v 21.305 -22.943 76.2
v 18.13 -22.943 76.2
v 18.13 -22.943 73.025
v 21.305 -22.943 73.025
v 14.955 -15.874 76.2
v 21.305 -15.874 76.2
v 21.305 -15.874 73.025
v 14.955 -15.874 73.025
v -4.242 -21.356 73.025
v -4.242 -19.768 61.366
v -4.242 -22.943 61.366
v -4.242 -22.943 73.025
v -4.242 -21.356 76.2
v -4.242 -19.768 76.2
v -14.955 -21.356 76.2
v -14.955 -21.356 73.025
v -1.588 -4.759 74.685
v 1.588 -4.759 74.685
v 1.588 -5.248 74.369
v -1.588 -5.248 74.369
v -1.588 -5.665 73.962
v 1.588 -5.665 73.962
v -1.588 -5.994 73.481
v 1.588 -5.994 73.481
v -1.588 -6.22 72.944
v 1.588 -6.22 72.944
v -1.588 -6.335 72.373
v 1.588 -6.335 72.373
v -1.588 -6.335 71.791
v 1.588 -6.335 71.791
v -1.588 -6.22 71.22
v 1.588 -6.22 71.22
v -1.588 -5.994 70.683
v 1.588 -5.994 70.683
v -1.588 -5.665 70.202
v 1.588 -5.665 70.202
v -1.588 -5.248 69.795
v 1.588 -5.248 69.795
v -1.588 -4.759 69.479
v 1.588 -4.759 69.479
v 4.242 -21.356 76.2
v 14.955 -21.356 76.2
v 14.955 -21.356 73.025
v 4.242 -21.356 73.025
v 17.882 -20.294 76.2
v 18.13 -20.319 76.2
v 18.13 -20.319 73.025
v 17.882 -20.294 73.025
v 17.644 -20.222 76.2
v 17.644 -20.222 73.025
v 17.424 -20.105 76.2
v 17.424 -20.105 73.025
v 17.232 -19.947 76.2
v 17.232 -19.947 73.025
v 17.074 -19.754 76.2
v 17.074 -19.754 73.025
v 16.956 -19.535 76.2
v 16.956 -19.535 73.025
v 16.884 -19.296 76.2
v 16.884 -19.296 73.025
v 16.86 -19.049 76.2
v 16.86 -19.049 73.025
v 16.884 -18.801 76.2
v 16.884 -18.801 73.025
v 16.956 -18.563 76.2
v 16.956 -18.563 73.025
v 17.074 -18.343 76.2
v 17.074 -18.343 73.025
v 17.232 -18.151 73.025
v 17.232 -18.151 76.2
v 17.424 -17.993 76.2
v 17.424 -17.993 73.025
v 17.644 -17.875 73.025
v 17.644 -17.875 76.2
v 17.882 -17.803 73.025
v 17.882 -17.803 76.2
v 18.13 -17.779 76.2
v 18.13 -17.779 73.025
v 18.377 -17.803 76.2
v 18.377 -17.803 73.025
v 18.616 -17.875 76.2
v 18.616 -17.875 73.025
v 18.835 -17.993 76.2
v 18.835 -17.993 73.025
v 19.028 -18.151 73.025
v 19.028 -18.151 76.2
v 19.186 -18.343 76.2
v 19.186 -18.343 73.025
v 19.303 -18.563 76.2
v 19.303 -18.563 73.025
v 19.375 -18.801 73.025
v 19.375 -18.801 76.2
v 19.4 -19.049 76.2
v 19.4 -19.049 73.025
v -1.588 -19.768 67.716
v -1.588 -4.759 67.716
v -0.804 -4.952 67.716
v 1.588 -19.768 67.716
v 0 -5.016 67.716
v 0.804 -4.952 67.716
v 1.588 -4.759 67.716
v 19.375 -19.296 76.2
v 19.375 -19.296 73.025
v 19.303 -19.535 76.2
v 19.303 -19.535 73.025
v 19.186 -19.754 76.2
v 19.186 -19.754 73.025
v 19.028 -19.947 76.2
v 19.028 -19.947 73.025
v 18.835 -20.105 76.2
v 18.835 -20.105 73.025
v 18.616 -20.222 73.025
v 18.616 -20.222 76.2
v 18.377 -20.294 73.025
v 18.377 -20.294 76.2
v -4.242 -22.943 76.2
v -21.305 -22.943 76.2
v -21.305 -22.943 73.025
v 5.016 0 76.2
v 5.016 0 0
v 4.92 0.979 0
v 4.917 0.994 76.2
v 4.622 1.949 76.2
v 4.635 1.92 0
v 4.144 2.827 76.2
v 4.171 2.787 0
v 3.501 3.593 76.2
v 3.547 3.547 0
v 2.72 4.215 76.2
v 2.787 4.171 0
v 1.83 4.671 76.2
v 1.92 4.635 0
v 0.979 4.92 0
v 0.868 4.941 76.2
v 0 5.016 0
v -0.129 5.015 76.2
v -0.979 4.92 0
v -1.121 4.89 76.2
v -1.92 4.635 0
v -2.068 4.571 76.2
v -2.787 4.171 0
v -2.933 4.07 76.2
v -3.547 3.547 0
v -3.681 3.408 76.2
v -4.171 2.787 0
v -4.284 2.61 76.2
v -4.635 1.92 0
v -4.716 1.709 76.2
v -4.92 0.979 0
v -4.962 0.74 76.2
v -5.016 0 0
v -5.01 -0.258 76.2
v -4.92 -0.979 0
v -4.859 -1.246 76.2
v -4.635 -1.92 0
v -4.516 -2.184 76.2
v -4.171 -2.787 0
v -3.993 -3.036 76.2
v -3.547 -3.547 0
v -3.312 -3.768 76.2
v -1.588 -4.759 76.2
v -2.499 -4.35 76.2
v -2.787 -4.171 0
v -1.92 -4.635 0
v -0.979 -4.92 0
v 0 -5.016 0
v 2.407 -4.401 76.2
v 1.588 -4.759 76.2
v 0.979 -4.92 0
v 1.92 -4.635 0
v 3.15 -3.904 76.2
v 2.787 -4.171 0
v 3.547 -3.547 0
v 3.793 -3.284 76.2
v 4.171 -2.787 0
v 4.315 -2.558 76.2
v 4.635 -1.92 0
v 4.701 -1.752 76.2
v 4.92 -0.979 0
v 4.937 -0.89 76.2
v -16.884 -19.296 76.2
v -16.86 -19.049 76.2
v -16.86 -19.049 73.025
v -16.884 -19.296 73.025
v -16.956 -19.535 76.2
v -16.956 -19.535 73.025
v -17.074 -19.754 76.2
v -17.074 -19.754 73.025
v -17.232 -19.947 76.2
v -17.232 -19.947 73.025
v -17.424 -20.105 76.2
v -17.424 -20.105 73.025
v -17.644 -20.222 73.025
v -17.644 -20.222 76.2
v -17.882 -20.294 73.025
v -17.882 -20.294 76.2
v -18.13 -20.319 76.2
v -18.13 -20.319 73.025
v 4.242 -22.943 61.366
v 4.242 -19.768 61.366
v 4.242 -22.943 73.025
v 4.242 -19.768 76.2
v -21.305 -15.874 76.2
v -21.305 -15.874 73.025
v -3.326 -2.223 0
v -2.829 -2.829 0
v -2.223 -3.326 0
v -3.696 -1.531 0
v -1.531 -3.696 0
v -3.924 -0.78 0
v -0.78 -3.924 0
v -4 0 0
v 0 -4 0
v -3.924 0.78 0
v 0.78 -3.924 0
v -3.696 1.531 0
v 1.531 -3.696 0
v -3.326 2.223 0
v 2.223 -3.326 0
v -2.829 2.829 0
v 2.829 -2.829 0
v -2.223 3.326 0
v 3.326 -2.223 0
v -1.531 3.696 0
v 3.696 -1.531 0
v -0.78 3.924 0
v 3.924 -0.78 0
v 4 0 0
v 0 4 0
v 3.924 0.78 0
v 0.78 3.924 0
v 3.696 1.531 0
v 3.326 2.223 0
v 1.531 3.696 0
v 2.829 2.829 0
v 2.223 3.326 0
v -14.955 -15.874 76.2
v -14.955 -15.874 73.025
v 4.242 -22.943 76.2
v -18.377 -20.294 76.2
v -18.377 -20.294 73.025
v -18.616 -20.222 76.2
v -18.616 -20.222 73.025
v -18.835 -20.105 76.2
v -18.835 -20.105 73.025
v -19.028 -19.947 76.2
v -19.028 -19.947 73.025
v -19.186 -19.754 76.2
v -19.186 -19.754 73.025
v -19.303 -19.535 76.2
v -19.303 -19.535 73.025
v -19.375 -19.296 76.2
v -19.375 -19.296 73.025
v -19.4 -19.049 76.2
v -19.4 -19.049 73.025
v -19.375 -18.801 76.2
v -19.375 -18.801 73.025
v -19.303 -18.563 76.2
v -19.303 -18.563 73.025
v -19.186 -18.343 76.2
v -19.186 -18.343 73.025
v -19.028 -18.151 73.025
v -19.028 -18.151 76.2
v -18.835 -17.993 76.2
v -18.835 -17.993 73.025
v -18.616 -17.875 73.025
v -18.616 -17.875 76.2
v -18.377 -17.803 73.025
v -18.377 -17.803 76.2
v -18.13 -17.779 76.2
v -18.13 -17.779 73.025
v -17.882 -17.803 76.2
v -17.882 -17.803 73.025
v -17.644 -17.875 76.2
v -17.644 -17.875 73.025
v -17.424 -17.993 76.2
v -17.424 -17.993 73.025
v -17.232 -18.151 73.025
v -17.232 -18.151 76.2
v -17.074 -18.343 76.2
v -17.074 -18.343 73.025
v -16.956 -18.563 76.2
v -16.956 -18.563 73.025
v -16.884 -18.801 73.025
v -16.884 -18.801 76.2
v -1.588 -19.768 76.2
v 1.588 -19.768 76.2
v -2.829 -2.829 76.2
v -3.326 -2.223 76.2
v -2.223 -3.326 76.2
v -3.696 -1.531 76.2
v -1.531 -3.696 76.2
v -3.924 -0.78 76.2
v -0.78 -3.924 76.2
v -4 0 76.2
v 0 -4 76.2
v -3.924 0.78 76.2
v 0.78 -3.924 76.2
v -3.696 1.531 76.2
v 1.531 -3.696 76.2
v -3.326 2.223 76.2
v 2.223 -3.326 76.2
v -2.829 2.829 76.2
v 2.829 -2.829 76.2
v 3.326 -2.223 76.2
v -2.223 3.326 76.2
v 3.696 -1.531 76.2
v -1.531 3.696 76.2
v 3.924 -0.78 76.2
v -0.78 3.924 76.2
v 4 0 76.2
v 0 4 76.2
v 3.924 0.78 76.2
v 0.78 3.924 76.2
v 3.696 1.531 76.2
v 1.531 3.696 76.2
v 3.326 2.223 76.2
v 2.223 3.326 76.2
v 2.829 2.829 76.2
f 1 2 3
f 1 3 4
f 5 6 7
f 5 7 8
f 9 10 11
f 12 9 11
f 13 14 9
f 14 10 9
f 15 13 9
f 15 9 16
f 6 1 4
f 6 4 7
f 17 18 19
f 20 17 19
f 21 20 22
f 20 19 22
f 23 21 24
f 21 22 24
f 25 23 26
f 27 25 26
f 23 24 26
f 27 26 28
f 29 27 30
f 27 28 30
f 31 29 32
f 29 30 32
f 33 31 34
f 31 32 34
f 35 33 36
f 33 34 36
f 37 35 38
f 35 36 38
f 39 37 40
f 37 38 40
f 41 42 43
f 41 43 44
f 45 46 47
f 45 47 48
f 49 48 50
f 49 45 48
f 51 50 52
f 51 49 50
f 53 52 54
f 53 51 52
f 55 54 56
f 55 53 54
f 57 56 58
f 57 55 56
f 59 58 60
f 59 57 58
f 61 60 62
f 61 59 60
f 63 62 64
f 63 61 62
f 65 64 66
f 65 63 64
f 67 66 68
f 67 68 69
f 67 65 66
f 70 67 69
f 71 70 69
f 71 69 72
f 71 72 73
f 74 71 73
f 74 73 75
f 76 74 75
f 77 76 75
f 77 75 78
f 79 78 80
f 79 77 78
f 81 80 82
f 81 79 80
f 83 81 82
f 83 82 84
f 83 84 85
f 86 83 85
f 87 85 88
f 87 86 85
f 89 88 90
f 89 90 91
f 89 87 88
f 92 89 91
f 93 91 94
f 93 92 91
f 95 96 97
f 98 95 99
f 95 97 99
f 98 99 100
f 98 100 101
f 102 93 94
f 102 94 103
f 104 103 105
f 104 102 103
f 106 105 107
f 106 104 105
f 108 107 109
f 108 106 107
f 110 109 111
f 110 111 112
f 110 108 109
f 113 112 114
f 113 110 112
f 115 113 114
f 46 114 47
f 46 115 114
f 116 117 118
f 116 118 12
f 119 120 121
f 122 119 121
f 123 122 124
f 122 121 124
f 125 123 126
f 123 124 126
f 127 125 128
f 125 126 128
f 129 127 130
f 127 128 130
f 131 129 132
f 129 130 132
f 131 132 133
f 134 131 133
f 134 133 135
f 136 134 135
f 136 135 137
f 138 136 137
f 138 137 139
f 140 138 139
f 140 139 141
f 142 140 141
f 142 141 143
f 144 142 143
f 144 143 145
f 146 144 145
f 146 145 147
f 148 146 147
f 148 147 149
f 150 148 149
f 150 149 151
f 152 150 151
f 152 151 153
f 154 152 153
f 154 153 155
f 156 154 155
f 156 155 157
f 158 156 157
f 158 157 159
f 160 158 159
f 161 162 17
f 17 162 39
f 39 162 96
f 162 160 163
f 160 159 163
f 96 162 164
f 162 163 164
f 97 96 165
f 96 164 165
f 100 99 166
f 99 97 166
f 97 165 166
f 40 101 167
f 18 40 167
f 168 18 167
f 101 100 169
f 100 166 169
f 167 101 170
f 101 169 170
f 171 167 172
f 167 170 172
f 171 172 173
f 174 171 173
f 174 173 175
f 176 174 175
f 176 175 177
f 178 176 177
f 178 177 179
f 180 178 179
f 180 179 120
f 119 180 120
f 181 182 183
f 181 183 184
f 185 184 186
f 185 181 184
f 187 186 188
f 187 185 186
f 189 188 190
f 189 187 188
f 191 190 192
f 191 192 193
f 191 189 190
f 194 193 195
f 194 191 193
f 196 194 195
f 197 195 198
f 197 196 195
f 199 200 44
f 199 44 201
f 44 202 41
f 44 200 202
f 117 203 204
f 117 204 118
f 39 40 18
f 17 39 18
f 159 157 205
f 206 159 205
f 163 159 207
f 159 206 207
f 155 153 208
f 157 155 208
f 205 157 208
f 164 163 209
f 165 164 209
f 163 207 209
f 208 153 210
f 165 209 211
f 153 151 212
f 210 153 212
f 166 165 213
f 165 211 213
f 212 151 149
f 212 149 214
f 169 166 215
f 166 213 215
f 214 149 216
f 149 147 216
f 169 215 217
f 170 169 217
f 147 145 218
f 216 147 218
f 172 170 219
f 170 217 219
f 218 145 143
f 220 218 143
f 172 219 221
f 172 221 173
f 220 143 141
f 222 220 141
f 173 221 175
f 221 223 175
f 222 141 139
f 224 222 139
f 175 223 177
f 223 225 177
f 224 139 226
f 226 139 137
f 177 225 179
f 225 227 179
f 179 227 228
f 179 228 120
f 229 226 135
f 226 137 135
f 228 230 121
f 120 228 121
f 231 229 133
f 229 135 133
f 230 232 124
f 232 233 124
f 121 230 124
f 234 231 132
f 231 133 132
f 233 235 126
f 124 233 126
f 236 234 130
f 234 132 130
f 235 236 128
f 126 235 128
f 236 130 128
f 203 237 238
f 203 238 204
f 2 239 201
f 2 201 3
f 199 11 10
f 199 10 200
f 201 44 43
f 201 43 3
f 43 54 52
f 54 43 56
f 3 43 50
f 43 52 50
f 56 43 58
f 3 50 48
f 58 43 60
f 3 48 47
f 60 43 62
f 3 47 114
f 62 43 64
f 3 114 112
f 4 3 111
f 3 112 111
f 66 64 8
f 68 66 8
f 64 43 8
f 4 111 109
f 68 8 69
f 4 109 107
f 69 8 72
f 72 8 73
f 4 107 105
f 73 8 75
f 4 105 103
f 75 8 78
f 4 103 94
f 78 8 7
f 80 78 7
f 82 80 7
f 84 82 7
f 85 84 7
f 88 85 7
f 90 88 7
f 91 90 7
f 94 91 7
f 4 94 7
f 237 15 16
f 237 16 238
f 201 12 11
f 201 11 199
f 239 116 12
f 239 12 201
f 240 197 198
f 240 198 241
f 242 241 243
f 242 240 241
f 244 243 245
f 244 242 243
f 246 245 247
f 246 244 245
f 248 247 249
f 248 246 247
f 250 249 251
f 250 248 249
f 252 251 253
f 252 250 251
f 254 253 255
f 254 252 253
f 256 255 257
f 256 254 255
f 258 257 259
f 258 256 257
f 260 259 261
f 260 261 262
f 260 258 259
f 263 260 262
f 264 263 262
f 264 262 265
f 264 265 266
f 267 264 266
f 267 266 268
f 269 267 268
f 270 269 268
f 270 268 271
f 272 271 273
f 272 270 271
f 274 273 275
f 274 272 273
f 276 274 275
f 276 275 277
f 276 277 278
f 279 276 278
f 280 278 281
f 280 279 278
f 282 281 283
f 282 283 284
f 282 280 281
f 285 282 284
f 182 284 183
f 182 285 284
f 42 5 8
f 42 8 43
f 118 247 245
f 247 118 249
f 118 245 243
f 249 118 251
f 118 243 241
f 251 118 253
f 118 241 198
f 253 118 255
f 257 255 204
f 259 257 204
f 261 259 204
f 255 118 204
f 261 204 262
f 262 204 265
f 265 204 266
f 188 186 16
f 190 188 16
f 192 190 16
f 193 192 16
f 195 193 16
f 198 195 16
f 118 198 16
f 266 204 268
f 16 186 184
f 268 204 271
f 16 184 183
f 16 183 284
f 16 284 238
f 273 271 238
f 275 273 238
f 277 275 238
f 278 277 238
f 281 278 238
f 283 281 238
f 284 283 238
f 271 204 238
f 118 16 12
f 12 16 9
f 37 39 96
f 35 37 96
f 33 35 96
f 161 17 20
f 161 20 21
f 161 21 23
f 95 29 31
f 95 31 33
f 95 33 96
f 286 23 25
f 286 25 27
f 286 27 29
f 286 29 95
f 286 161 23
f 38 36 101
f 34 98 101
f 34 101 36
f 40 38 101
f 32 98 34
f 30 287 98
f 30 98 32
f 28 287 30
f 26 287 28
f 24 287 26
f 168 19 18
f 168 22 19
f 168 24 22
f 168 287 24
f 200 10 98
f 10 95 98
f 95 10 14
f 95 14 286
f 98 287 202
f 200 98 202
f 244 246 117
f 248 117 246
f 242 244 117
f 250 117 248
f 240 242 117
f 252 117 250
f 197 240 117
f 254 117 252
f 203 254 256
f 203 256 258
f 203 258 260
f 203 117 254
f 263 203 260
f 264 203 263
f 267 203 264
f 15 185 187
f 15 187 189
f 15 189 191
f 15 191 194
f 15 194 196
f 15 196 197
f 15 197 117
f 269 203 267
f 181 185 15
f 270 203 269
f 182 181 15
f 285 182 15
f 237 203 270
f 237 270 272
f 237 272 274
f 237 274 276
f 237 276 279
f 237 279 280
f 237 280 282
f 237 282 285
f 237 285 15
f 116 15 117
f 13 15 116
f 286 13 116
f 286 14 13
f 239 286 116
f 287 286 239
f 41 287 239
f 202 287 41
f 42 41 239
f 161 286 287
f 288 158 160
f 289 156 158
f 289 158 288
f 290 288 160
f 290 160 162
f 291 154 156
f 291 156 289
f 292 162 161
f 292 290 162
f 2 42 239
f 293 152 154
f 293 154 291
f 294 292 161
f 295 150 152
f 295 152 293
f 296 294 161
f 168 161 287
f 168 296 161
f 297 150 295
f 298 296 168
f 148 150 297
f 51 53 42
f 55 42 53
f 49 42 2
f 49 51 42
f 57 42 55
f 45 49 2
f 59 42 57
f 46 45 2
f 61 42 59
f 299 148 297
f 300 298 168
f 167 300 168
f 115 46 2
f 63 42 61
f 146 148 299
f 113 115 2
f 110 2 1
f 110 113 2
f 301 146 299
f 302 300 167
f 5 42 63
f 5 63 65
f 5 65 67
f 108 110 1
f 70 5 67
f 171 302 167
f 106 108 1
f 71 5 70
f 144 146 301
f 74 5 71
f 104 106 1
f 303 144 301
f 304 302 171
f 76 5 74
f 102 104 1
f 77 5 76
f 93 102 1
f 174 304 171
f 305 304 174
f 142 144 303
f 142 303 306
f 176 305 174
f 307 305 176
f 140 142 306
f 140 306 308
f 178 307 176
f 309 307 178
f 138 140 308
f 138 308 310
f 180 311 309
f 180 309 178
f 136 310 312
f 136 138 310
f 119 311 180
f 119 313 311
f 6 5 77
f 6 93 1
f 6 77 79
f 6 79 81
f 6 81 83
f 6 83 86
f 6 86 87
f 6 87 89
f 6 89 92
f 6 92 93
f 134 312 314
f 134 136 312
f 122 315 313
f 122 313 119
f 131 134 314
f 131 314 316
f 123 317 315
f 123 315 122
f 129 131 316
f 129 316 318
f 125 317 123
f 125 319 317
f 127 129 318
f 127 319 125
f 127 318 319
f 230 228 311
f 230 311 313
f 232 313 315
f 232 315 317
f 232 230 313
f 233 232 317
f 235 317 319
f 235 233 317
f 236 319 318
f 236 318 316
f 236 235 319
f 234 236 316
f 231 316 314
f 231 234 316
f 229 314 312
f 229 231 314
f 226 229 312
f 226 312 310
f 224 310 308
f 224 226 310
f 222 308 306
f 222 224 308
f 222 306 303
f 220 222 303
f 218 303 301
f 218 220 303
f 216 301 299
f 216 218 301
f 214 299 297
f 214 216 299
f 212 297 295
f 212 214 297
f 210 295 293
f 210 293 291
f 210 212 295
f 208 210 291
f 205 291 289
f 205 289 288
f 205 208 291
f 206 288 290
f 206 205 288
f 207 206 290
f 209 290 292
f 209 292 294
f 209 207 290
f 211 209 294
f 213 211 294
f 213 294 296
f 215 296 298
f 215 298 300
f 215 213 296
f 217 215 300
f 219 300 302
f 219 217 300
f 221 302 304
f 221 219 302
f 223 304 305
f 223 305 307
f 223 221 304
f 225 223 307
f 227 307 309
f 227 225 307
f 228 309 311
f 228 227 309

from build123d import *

# Parameters (mm, degrees)
F0_R     = 5.0165
F0_R_2   = 4.0005
F1_DEPTH = 76.2
F3_DEPTH = 8.4836
F5_DEPTH = 25.4
F7_DEPTH = 3.175
F8_W     = 8.4836
F8_H     = 3.175
F9_DEPTH = 6.35


# Not quite as in the source:
# - ends of sketch curves that miss each other by under 0.0002 mm in the source are joined


with BuildPart() as f1:
    # F0 (on Top) → F1 (new body)
    with BuildSketch(Plane.XY):
        Circle(F0_R)
        Circle(F0_R_2, mode=Mode.SUBTRACT)
    extrude(amount=F1_DEPTH)

    # F2 (on face) → F3 (join)
    with BuildSketch(Plane.XY.offset(76.2)):
        Polygon((-4.2418, -22.9430834), (0, -22.9430834), (4.2418, -22.9430834), (4.2418, -19.7680834), (1.5875, -19.7680834), (1.5875, -5.0165), (1.5875, -4.7586884748), (0, -4.7586884748), (-1.5875, -4.7586884748), (-1.5875, -19.7680834), (-4.2418, -19.7680834), align=None)
    extrude(amount=-F3_DEPTH)

    # F4 (on face) → F5 (cut)
    with BuildSketch(Plane.YZ.offset(1.5875)):
        with BuildLine():
            Line((-4.7586884748, 69.4789886475), (-4.7586884748, 74.6846720576))
            ThreePointArc((-4.7586884748, 74.6846720576), (-6.34993848, 72.0818303525), (-4.7586884748, 69.4789886475))
        make_face()
    extrude(amount=-F5_DEPTH, mode=Mode.SUBTRACT)

    # F6 (on face) → F7 (join)
    with BuildSketch(Plane.XY.offset(76.2)):
        Polygon((4.2418, -21.3555831969), (4.2418, -22.9430834), (18.1297326, -22.9430831969), (21.3047326, -22.9430831969), (21.3047326, -22.2236789969), (21.3047326, -15.8736789969), (14.9547326, -15.8736789969), (14.9547326, -21.3555831969), align=None)
        with BuildLine():
            ThreePointArc((18.1297326, -20.3186789969), (17.2317069879, -18.1506533848), (19.3997326, -19.0486789969))
            ThreePointArc((19.3997326, -19.0486789969), (19.0277582121, -19.946704609), (18.1297326, -20.3186789969))
        make_face(mode=Mode.SUBTRACT)
        Polygon((-4.2418, -22.9430831969), (0, -22.9430831969), (4.2418, -22.9430831969), (4.2418, -21.3555831969), (-4.2418, -21.3555831969), align=None)
        Polygon((-18.1297326, -22.9430831969), (-4.2418, -22.9430831969), (-4.2418, -21.3555831969), (-14.9547326, -21.3555831969), (-14.9547326, -15.8736789969), (-21.3047326, -15.8736789969), (-21.3047326, -22.2236789969), (-21.3047326, -22.9430831969), align=None)
        with BuildLine():
            ThreePointArc((-18.1297326, -20.3186789969), (-19.0277582121, -18.1506533848), (-16.8597326, -19.0486789969))
            ThreePointArc((-16.8597326, -19.0486789969), (-17.2317069879, -19.946704609), (-18.1297326, -20.3186789969))
        make_face(mode=Mode.SUBTRACT)
    extrude(amount=-F7_DEPTH)

    # F8 (on face) → F9 (join)
    with BuildSketch(Plane(origin=(0, 0, 67.7164), x_dir=(1, 0, 0), z_dir=(0, 0, -1))):
        with Locations((0, 21.3555834)):
            Rectangle(F8_W, F8_H)
    extrude(amount=F9_DEPTH)


solid = f1.part
